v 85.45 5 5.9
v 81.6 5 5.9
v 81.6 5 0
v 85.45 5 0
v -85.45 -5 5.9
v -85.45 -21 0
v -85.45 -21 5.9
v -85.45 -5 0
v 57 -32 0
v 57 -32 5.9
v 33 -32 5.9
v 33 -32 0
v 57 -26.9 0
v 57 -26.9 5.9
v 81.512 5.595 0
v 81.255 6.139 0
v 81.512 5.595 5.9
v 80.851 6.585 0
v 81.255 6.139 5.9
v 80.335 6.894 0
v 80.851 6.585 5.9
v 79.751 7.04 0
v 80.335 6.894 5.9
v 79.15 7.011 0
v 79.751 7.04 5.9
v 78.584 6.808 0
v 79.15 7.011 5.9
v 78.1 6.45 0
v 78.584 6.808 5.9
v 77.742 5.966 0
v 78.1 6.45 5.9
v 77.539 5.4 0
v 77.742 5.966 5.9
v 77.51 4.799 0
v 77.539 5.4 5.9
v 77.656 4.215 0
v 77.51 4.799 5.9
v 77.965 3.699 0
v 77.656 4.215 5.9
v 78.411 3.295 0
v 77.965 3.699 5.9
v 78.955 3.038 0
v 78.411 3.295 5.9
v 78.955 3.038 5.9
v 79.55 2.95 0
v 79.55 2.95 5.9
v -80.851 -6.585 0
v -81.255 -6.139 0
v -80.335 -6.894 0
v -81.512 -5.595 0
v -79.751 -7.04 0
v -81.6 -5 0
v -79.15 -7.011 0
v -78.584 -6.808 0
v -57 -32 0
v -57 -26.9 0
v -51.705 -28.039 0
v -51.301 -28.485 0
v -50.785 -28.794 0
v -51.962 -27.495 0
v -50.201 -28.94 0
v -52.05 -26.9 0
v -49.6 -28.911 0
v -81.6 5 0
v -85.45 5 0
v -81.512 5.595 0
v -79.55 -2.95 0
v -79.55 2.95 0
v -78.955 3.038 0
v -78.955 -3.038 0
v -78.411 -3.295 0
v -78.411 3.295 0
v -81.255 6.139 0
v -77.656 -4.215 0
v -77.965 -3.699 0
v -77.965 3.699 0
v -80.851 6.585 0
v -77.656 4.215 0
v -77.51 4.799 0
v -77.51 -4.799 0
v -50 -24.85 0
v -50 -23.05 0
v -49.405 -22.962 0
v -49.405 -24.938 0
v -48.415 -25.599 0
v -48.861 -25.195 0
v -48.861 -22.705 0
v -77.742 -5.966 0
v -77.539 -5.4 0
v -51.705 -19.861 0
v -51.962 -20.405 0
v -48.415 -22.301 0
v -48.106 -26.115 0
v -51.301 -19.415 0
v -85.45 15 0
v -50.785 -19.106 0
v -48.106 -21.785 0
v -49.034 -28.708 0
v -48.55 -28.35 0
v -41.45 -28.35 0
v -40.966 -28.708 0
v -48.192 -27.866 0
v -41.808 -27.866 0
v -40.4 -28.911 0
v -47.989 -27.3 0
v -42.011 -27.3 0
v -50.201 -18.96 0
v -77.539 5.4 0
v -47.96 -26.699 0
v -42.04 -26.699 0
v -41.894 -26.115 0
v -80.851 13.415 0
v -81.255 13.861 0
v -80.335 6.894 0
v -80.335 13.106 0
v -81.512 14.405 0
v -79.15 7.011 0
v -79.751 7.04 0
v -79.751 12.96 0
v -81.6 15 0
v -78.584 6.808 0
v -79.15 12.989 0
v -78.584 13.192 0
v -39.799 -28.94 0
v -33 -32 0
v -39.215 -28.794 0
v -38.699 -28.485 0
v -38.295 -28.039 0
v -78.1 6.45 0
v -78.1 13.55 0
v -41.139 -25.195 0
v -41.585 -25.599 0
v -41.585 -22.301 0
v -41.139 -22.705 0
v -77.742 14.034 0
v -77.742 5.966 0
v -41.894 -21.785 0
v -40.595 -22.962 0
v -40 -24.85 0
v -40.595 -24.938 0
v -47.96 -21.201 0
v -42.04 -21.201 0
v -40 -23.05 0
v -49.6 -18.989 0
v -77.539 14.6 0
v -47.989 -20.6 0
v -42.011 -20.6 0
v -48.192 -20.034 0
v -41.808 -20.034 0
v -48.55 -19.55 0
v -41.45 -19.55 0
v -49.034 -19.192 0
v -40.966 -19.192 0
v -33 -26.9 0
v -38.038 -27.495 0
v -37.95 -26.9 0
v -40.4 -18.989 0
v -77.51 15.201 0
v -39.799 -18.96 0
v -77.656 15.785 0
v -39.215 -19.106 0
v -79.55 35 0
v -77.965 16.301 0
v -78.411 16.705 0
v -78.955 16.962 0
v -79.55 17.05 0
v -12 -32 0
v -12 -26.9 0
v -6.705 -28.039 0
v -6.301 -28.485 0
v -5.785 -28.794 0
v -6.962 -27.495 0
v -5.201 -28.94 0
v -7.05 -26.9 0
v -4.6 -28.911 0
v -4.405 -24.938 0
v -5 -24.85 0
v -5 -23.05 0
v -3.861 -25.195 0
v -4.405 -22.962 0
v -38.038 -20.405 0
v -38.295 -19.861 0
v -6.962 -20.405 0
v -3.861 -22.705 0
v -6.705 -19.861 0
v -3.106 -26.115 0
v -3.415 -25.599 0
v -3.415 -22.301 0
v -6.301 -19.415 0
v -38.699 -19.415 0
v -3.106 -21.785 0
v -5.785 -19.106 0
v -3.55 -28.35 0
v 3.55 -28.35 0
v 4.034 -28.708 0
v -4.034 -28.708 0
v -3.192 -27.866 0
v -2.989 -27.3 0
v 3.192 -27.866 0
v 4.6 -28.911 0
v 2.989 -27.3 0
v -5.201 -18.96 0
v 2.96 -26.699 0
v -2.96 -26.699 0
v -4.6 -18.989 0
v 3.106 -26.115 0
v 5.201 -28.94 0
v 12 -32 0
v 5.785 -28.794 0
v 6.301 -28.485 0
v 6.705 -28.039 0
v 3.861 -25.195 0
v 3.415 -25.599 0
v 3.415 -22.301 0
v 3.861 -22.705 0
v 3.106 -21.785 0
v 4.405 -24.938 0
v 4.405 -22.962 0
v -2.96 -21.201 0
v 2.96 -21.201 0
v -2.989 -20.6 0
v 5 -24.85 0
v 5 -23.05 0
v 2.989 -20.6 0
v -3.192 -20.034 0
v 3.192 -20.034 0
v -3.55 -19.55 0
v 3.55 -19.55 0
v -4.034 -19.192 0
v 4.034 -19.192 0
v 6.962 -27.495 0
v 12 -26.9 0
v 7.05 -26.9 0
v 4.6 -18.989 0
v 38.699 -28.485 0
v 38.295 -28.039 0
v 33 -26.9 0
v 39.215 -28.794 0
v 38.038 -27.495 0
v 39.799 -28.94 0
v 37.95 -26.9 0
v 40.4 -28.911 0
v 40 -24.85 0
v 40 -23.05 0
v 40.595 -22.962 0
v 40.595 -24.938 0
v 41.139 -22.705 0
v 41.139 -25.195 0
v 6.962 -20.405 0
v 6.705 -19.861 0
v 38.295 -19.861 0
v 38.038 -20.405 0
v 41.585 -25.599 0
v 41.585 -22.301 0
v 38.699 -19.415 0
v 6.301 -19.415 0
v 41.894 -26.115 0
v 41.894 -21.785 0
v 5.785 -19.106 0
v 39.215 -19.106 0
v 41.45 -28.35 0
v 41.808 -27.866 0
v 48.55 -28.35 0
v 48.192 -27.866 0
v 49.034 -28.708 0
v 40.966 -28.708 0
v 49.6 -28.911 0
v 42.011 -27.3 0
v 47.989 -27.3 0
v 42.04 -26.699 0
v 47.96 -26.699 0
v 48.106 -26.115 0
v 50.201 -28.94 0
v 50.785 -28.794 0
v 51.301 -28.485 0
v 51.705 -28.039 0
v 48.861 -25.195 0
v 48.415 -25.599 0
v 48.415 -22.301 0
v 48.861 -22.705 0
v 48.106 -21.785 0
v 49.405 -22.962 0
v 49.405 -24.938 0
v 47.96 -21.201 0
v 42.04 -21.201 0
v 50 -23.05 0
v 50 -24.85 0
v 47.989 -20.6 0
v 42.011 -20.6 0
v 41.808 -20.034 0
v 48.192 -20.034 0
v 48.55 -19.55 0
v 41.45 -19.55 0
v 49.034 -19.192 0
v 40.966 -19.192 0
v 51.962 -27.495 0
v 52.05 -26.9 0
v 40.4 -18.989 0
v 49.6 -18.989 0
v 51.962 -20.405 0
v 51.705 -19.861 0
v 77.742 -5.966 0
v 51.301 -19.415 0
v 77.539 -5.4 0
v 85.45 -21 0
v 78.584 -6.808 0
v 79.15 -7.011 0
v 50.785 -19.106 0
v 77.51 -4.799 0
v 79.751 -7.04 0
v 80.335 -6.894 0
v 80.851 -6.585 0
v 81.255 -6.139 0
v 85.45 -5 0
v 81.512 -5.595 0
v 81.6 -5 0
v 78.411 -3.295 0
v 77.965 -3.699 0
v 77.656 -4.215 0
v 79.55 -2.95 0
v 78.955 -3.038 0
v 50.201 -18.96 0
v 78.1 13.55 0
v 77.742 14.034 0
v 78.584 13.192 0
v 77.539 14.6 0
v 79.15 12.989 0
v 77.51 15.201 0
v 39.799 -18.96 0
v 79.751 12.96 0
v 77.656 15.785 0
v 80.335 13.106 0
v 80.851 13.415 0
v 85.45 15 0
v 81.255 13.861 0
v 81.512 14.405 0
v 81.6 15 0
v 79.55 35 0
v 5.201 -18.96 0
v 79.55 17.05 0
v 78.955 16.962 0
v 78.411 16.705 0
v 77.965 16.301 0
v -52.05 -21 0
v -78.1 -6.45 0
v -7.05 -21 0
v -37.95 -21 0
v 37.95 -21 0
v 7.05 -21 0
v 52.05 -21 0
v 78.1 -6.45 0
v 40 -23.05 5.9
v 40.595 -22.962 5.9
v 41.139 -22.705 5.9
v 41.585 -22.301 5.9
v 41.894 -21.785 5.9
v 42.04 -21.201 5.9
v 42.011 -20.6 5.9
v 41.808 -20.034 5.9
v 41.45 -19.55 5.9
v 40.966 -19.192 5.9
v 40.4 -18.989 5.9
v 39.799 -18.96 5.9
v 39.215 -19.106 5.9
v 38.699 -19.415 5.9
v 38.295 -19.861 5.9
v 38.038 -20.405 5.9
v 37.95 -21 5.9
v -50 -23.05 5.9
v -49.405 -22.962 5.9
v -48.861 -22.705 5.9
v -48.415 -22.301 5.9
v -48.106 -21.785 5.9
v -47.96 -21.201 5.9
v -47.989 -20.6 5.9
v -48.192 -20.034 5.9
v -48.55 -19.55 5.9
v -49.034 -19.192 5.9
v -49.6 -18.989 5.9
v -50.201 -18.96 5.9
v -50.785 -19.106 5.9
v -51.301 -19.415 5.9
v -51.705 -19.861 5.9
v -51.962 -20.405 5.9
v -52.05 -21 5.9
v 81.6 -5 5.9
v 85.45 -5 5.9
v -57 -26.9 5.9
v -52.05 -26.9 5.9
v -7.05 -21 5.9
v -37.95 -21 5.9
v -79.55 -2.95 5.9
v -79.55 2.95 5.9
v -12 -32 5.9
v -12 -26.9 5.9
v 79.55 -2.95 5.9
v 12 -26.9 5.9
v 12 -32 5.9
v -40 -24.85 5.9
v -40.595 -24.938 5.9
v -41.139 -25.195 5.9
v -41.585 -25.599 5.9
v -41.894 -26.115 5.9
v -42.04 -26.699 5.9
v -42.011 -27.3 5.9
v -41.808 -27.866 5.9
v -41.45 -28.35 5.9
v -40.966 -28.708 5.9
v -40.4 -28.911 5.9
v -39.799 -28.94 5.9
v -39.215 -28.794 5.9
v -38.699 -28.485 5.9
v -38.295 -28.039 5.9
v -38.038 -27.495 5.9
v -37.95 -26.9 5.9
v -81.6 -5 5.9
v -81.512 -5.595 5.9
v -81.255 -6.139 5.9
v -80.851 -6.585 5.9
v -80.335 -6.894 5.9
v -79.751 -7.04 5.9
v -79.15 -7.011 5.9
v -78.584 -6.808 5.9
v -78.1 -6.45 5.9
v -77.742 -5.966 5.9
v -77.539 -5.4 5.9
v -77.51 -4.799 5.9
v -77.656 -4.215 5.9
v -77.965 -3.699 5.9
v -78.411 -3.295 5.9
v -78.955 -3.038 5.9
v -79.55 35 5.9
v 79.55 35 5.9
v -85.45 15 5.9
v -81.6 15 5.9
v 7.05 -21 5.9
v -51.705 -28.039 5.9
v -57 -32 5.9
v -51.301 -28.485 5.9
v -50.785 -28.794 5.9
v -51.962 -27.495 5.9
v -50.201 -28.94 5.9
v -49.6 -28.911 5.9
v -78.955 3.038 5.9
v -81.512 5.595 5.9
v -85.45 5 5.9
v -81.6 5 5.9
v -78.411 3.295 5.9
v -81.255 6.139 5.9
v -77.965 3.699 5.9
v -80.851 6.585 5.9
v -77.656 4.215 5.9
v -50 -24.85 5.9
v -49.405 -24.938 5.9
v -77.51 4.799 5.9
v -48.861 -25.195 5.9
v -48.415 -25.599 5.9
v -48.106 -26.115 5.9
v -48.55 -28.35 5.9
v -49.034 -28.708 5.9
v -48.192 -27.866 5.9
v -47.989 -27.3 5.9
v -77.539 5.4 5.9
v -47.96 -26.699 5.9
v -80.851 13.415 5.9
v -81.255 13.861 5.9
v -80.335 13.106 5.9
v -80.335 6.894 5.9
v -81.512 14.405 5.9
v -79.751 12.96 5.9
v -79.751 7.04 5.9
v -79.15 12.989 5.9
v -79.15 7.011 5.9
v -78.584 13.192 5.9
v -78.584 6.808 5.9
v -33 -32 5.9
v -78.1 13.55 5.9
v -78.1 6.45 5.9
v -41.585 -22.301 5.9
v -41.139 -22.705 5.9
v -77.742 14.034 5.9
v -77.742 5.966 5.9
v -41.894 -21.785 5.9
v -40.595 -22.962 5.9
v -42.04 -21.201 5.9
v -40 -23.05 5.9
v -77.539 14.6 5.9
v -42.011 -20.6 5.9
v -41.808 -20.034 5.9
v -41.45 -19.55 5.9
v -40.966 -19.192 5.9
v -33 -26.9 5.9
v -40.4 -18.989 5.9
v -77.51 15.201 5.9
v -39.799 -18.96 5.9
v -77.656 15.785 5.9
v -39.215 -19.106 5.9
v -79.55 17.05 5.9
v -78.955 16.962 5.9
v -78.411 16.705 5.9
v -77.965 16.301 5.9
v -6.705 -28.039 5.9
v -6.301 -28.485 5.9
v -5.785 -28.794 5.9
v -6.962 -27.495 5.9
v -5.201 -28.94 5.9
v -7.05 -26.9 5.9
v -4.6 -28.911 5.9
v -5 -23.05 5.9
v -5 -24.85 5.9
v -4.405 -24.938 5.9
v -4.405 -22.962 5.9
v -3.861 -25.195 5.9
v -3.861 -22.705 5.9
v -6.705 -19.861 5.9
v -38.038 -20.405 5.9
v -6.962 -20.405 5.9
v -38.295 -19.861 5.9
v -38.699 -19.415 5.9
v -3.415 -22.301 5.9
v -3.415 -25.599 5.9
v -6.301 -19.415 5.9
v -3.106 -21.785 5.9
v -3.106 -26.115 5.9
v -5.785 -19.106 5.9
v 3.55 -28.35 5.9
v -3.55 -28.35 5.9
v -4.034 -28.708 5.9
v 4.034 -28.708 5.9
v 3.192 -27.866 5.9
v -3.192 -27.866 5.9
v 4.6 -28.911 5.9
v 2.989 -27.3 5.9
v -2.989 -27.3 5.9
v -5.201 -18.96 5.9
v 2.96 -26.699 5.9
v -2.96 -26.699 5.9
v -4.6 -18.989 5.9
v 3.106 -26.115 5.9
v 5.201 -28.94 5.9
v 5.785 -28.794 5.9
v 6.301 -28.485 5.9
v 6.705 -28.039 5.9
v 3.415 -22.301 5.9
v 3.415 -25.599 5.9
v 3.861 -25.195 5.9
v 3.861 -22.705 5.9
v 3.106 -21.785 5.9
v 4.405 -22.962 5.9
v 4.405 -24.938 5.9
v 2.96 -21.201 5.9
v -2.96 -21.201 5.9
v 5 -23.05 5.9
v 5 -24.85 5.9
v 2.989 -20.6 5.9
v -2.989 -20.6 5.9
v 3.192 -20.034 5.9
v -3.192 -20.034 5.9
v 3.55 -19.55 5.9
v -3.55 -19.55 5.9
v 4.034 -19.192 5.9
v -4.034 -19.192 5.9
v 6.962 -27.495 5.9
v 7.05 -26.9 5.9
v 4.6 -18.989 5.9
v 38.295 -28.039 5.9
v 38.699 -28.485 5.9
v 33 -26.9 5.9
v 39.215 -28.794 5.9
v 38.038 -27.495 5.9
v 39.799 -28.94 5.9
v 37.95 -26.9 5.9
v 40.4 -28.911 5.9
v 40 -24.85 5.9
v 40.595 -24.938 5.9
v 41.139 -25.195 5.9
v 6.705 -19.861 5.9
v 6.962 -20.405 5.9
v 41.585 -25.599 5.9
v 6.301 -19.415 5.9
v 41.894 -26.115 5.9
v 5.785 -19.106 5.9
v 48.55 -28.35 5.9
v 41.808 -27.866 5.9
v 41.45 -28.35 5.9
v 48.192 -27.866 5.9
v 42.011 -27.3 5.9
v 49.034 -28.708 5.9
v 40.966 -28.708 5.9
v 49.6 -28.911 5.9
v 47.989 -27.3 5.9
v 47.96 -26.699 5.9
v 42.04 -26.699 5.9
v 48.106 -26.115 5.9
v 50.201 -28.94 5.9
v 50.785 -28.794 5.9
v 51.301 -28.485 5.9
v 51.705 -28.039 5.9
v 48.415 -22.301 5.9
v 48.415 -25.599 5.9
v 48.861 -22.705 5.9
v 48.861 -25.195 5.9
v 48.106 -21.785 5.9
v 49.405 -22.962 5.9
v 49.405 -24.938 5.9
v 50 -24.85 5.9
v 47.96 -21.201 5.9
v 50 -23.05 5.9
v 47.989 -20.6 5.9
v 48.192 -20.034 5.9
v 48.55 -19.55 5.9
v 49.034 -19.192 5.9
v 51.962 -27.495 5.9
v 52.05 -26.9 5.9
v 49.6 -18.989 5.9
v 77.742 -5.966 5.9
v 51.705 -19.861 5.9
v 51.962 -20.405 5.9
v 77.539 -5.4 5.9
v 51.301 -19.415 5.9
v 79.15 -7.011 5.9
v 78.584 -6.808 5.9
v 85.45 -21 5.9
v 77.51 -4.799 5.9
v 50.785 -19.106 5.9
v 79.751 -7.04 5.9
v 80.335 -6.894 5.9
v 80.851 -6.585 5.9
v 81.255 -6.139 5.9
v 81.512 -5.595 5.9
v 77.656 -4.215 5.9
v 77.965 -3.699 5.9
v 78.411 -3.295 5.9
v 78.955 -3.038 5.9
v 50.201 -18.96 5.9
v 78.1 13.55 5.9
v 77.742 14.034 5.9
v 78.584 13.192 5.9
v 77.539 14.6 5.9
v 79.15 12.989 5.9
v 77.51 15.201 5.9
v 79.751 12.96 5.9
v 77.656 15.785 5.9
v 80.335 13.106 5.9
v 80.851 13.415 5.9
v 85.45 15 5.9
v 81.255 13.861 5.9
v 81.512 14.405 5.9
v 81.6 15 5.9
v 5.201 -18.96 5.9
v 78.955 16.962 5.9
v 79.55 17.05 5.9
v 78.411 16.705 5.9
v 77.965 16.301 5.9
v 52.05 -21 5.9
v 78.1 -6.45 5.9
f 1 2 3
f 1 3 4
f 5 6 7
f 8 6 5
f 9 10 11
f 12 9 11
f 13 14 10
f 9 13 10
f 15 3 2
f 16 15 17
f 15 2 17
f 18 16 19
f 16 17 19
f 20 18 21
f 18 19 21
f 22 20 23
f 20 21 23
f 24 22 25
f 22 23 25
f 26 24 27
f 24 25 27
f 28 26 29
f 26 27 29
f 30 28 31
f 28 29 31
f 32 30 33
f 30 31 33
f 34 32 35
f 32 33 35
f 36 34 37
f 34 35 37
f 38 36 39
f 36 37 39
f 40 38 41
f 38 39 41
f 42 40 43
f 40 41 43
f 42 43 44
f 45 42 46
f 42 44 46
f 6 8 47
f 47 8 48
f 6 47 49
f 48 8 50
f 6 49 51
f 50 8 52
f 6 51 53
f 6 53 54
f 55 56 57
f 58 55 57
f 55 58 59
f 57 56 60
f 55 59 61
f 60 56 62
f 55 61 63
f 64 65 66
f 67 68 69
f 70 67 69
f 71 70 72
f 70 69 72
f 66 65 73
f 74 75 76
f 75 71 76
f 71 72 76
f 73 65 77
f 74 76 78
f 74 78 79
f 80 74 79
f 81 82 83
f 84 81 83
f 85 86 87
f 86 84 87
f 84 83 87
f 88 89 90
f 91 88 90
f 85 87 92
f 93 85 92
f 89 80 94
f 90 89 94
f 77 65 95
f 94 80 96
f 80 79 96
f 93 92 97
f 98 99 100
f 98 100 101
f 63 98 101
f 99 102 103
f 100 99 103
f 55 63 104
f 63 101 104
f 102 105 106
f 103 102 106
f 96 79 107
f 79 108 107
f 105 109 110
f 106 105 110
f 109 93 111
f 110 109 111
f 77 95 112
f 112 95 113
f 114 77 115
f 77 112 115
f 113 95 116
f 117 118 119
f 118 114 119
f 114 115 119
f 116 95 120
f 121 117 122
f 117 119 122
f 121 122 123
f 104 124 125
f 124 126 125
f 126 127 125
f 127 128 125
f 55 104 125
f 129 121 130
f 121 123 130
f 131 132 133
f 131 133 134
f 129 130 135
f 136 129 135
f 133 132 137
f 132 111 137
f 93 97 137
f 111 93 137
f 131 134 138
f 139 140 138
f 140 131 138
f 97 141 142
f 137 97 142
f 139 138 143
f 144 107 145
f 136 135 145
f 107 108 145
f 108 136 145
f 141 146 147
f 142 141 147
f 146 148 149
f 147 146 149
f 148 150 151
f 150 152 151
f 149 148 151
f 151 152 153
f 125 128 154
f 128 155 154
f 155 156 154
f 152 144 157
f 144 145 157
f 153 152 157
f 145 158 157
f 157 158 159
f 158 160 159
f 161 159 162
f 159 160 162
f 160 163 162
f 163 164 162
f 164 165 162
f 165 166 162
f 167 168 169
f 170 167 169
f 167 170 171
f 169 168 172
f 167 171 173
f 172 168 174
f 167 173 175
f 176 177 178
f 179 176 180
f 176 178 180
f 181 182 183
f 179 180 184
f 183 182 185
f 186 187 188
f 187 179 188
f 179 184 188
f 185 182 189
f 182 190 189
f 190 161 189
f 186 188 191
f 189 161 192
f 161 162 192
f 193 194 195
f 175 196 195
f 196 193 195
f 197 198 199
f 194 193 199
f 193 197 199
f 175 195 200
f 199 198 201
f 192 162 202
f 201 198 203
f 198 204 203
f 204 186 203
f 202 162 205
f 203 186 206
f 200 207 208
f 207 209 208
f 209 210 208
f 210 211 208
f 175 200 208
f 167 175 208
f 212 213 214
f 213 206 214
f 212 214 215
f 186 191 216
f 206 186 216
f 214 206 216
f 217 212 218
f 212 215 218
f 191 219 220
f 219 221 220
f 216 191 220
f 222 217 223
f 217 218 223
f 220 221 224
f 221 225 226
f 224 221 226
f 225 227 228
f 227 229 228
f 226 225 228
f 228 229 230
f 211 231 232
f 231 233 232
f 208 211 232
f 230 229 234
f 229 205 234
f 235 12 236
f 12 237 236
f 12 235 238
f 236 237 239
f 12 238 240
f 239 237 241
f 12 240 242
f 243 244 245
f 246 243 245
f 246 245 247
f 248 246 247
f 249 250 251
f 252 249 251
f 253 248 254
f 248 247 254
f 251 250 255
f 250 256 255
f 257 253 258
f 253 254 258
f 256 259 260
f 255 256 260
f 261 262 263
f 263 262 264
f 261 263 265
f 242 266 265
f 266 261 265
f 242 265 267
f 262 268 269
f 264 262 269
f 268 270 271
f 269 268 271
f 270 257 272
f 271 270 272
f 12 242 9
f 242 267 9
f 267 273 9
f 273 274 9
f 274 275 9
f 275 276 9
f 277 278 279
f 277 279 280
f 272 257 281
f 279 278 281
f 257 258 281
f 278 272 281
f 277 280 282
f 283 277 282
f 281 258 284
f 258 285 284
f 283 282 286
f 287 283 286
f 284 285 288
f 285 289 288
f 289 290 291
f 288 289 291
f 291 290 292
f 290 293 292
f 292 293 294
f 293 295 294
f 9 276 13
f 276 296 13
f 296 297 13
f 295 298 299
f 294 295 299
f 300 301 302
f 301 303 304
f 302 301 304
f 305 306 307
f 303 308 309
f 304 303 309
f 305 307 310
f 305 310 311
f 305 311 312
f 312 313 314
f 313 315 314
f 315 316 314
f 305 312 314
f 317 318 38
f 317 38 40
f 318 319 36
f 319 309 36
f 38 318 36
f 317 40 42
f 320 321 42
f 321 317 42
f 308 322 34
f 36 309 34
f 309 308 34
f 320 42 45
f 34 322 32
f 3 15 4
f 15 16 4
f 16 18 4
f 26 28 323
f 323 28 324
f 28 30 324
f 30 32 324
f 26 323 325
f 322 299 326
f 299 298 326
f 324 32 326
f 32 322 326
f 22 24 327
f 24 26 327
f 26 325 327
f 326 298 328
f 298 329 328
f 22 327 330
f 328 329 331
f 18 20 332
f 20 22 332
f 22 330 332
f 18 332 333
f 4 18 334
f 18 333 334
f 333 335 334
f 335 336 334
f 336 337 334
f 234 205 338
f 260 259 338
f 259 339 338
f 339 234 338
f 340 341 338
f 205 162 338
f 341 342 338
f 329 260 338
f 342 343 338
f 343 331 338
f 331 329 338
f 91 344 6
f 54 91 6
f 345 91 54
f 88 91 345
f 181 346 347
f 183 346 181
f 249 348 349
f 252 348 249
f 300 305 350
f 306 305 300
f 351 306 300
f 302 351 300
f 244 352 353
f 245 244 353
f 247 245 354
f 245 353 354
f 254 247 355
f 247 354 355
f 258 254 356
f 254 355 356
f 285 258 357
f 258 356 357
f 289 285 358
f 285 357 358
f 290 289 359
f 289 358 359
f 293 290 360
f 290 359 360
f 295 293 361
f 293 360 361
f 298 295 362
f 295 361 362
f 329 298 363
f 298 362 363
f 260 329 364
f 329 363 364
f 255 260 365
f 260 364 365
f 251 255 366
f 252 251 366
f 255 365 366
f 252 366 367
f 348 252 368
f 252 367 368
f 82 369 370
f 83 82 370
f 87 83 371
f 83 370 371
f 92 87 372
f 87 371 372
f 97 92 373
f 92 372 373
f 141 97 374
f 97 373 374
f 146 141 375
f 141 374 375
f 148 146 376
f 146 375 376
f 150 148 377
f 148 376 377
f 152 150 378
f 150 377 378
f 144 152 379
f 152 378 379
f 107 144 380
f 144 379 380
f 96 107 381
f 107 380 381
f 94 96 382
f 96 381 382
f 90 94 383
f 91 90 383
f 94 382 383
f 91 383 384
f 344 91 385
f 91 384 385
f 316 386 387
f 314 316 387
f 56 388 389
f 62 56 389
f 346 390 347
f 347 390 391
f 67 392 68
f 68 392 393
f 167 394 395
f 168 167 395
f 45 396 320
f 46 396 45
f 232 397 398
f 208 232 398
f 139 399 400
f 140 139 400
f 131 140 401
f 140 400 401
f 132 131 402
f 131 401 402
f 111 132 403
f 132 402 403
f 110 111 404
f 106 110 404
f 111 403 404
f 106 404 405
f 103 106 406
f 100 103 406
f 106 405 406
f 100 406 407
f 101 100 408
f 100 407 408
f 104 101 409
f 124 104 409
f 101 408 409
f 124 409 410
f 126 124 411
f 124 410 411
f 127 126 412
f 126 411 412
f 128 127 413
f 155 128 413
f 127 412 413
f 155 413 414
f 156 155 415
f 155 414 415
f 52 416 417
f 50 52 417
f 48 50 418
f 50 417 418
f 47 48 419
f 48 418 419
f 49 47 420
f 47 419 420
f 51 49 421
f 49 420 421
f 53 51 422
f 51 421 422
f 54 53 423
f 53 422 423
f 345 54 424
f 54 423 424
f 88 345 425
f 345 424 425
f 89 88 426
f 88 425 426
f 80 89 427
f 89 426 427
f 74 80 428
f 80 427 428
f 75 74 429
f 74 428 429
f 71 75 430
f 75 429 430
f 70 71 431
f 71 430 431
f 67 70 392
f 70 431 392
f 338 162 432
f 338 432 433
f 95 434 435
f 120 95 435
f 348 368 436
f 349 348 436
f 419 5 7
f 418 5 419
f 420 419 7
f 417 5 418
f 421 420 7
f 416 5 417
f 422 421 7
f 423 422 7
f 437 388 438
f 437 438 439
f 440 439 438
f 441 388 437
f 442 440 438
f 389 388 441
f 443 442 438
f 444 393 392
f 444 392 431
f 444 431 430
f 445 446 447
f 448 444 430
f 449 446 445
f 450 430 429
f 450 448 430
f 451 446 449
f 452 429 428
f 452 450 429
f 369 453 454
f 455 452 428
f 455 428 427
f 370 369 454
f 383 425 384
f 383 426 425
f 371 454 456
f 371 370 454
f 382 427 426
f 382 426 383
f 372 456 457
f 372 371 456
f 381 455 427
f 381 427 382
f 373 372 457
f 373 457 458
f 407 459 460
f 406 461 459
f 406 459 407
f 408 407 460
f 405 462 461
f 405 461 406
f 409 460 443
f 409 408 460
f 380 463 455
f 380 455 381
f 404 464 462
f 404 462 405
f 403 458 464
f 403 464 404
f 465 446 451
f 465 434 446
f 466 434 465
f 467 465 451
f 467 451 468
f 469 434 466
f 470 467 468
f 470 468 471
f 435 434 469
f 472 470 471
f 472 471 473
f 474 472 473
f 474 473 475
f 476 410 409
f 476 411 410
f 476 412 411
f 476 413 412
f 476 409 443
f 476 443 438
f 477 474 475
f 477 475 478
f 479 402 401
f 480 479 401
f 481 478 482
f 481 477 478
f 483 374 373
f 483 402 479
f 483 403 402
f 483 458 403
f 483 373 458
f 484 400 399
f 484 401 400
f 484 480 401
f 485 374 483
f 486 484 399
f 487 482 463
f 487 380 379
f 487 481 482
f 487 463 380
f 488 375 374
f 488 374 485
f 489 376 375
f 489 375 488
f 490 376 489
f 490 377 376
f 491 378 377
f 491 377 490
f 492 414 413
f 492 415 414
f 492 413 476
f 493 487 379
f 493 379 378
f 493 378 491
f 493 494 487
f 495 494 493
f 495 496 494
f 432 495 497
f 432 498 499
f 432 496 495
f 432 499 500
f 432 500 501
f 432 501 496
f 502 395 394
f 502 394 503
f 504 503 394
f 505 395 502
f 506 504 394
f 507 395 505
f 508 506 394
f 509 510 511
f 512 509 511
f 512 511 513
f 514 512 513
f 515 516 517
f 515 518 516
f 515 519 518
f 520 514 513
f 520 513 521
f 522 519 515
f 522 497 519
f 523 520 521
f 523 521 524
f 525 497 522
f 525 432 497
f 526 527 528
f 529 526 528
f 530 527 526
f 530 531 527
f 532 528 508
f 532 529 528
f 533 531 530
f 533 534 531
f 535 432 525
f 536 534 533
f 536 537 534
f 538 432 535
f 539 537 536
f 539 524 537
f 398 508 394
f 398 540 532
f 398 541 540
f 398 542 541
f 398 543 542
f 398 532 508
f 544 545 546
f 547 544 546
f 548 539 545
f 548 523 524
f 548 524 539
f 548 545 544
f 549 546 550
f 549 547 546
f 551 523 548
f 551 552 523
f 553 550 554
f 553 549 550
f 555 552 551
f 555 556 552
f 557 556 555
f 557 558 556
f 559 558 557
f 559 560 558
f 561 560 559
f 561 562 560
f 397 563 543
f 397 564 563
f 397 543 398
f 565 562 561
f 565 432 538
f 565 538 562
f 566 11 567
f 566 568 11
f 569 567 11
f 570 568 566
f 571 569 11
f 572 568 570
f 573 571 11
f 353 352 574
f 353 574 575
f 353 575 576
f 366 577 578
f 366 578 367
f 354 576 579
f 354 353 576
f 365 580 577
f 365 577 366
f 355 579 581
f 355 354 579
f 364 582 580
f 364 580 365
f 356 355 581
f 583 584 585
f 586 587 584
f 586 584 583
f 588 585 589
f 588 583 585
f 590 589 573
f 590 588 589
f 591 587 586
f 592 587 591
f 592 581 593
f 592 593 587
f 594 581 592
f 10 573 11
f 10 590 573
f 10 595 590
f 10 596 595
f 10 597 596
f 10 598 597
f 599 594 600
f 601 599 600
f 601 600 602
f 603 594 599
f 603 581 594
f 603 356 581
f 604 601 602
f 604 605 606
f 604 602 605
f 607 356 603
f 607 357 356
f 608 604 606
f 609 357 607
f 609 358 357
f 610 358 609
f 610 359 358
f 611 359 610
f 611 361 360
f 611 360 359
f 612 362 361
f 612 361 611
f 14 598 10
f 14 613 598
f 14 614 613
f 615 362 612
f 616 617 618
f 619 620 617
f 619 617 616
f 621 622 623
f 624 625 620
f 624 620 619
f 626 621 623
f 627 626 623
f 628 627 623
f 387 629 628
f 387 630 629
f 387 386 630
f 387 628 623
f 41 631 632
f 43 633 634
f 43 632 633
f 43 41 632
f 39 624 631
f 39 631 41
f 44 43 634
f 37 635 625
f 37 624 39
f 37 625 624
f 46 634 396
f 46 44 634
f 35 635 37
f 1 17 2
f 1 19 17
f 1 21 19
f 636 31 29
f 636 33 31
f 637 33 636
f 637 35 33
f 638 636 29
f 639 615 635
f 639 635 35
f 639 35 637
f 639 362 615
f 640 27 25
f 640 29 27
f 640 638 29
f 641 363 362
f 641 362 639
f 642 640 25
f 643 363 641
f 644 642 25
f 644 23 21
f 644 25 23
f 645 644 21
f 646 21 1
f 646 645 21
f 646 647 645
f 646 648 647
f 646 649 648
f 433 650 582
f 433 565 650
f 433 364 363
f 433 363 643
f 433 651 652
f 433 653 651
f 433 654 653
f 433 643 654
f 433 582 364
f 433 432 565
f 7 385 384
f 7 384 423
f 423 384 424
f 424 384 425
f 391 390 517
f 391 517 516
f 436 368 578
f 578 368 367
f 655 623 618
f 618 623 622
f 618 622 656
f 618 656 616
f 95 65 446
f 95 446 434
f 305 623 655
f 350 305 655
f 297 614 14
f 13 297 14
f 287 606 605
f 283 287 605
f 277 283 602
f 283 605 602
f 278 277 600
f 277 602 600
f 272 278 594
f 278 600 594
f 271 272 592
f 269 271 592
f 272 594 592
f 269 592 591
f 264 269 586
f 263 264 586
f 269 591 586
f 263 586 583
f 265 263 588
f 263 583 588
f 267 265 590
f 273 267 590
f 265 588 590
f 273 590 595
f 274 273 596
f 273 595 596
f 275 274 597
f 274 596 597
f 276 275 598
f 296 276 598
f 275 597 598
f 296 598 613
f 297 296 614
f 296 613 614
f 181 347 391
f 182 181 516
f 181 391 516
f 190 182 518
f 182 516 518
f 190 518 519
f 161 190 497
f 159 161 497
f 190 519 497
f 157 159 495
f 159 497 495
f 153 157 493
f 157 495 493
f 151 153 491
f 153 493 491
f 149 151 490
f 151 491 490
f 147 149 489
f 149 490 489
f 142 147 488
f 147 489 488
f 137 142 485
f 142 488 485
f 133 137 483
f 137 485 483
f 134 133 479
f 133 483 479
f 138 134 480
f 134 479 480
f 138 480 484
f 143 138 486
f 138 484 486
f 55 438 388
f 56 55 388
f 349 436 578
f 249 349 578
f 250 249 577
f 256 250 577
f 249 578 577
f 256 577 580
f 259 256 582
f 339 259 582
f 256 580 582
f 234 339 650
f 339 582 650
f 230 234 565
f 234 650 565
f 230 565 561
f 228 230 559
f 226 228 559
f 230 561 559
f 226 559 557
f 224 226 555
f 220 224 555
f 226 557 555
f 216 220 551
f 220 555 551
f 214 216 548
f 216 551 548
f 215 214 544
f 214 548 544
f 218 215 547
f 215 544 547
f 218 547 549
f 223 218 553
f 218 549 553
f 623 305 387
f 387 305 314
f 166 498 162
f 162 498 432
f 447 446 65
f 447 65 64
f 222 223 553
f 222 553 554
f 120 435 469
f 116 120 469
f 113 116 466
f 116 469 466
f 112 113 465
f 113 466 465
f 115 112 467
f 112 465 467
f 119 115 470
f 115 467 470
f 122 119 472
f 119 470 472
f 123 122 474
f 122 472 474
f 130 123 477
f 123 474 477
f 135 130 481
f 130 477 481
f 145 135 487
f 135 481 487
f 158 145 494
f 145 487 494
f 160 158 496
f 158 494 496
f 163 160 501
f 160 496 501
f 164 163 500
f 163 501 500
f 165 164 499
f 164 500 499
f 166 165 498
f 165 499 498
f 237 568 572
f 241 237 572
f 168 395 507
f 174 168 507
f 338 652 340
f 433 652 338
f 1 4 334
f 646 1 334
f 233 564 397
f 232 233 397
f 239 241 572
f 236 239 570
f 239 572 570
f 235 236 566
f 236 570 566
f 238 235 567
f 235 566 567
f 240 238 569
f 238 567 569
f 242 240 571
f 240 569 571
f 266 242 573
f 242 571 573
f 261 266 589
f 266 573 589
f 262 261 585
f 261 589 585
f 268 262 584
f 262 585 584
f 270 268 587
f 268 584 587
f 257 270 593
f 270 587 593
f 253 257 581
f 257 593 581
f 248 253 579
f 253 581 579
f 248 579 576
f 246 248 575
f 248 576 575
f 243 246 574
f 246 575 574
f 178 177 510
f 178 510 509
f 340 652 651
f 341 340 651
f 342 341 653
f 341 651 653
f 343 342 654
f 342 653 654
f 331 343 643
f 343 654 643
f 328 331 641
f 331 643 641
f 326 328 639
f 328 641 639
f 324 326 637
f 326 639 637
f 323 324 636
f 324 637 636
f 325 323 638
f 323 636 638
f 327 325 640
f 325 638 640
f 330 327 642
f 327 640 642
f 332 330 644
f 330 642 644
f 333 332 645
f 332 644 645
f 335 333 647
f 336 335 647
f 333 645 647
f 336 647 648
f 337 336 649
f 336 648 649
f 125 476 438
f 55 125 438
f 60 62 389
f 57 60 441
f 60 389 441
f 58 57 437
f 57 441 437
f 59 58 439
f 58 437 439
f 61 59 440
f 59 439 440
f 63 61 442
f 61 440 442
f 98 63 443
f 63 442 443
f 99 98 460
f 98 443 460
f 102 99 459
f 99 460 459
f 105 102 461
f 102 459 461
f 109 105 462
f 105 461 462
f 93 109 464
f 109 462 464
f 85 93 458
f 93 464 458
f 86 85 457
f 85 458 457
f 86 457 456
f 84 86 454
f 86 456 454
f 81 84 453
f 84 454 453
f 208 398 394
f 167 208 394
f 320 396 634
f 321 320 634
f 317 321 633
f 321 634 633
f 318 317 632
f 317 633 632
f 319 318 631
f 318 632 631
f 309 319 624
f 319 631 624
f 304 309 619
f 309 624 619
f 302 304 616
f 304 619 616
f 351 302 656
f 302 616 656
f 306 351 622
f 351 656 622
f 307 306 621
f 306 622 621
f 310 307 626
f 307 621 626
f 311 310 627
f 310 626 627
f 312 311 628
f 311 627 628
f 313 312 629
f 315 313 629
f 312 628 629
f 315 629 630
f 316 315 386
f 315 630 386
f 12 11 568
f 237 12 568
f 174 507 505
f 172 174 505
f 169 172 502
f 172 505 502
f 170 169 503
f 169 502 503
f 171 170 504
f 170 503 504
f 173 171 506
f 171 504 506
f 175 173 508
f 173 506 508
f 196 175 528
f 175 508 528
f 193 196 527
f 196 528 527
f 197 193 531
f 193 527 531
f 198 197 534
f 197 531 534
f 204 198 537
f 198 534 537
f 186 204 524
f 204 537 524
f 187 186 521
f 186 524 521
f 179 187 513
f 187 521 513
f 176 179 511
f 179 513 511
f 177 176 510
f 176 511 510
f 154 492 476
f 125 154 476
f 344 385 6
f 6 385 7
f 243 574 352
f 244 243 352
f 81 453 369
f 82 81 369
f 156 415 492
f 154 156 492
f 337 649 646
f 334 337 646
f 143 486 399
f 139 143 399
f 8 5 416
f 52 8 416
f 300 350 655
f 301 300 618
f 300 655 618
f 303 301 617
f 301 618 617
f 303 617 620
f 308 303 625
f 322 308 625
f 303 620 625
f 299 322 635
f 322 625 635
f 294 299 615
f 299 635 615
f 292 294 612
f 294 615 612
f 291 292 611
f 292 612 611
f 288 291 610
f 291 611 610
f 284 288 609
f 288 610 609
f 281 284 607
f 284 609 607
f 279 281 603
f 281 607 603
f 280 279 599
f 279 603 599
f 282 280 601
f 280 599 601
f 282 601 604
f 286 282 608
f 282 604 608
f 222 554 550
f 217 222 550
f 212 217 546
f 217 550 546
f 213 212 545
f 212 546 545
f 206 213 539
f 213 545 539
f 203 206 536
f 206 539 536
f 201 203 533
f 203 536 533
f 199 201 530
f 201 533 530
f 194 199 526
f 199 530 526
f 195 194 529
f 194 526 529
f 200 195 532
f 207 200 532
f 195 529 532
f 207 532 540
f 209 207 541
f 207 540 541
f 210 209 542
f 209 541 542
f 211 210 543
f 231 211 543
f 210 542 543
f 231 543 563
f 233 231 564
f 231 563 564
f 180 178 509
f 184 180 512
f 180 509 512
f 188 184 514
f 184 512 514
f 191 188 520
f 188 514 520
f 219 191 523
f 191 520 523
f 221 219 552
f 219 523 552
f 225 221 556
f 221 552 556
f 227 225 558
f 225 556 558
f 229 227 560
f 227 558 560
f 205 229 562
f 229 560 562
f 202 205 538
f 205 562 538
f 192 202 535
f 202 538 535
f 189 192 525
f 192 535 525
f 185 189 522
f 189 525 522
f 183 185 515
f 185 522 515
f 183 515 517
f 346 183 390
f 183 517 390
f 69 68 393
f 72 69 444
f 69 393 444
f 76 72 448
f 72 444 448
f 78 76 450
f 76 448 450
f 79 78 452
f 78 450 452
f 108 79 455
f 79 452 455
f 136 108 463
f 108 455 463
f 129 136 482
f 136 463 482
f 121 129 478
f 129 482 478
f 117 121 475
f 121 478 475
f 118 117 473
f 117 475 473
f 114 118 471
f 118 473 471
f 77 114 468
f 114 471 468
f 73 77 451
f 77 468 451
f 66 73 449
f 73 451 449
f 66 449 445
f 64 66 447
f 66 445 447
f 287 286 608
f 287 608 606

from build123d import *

# Parameters (mm, degrees)
SKETCH1_W           = 170.9
SKETCH1_H           = 70
BOSS_EXTRUDE1_DEPTH = 5.9
CUT_EXTRUDE1_DEPTH  = 6.9
SKETCH3_W           = 5.9
SKETCH3_H           = 10
CUT_EXTRUDE2_DEPTH  = 6.9
SKETCH4_W           = 5.9
SKETCH4_H           = 10
CUT_EXTRUDE3_DEPTH  = 6.9
CUT_EXTRUDE4_REACH  = 7.9
SKETCH5_R           = 2.05


with BuildPart() as part:
    # Sketch1 → Boss-Extrude1 (new body)
    with BuildSketch(Plane.XY):
        Rectangle(SKETCH1_W, SKETCH1_H)
    extrude(amount=BOSS_EXTRUDE1_DEPTH)

    # Sketch2 → Cut-Extrude1 (cut, through all)
    with BuildSketch(Plane.XY.offset(5.9)):
        Polygon((-50, -21), (-85.45, -21), (-85.45, -35), (85.45, -35), (85.45, -21), (50, -21), (50, -26.9), (57, -26.9), (57, -32), (33, -32), (33, -26.9), (40, -26.9), (40, -21), (5, -21), (5, -26.9), (12, -26.9), (12, -32), (-12, -32), (-12, -26.9), (-5, -26.9), (-5, -21), (-40, -21), (-40, -26.9), (-33, -26.9), (-33, -32), (-57, -32), (-57, -26.9), (-50, -26.9), align=None)
    extrude(amount=-CUT_EXTRUDE1_DEPTH, mode=Mode.SUBTRACT)

    # Sketch3 → Cut-Extrude2 (cut, through all)
    with BuildSketch(Plane.XY.offset(5.9)):
        with Locations((82.5, 20)):
            Rectangle(SKETCH3_W, SKETCH3_H)
        with Locations((82.5, 0)):
            Rectangle(SKETCH3_W, SKETCH3_H)
        with Locations((-82.5, 0)):
            Rectangle(SKETCH3_W, SKETCH3_H)
        with Locations((-82.5, 20)):
            Rectangle(SKETCH3_W, SKETCH3_H)
    extrude(amount=-CUT_EXTRUDE2_DEPTH, mode=Mode.SUBTRACT)

    # Sketch4 → Cut-Extrude3 (cut, through all)
    with BuildSketch(Plane.XY.offset(5.9)):
        with Locations((82.5, 30)):
            Rectangle(SKETCH4_W, SKETCH4_H)
        with Locations((-82.5, 30)):
            Rectangle(SKETCH4_W, SKETCH4_H)
    extrude(amount=-CUT_EXTRUDE3_DEPTH, mode=Mode.SUBTRACT)

    # Sketch5 → Cut-Extrude4 (cut, up to next)
    with BuildSketch(Plane.XY.offset(5.9), mode=Mode.PRIVATE) as cut_extrude4_sk1:
        with Locations((-50, -26.9)):
            Circle(SKETCH5_R)
    cut_extrude4_tool1 = extrude(cut_extrude4_sk1.sketch, amount=-CUT_EXTRUDE4_REACH, mode=Mode.PRIVATE) & part.part
    add(cut_extrude4_tool1.solids().sort_by_distance((-50, -26.9, 5.9))[0], mode=Mode.SUBTRACT)
    # Sketch5 → Cut-Extrude4 (cut, up to next)
    with BuildSketch(Plane.XY.offset(5.9), mode=Mode.PRIVATE) as cut_extrude4_sk2:
        with Locations((-40, -26.9)):
            Circle(SKETCH5_R)
    cut_extrude4_tool2 = extrude(cut_extrude4_sk2.sketch, amount=-CUT_EXTRUDE4_REACH, mode=Mode.PRIVATE) & part.part
    add(cut_extrude4_tool2.solids().sort_by_distance((-40, -26.9, 5.9))[0], mode=Mode.SUBTRACT)
    # Sketch5 → Cut-Extrude4 (cut, up to next)
    with BuildSketch(Plane.XY.offset(5.9), mode=Mode.PRIVATE) as cut_extrude4_sk3:
        with Locations((-50, -21)):
            Circle(SKETCH5_R)
    cut_extrude4_tool3 = extrude(cut_extrude4_sk3.sketch, amount=-CUT_EXTRUDE4_REACH, mode=Mode.PRIVATE) & part.part
    add(cut_extrude4_tool3.solids().sort_by_distance((-50, -21, 5.9))[0], mode=Mode.SUBTRACT)
    # Sketch5 → Cut-Extrude4 (cut, up to next)
    with BuildSketch(Plane.XY.offset(5.9), mode=Mode.PRIVATE) as cut_extrude4_sk4:
        with Locations((-40, -21)):
            Circle(SKETCH5_R)
    cut_extrude4_tool4 = extrude(cut_extrude4_sk4.sketch, amount=-CUT_EXTRUDE4_REACH, mode=Mode.PRIVATE) & part.part
    add(cut_extrude4_tool4.solids().sort_by_distance((-40, -21, 5.9))[0], mode=Mode.SUBTRACT)
    # Sketch5 → Cut-Extrude4 (cut, up to next)
    with BuildSketch(Plane.XY.offset(5.9), mode=Mode.PRIVATE) as cut_extrude4_sk5:
        with Locations((-5, -21)):
            Circle(SKETCH5_R)
    cut_extrude4_tool5 = extrude(cut_extrude4_sk5.sketch, amount=-CUT_EXTRUDE4_REACH, mode=Mode.PRIVATE) & part.part
    add(cut_extrude4_tool5.solids().sort_by_distance((-5, -21, 5.9))[0], mode=Mode.SUBTRACT)
    # Sketch5 → Cut-Extrude4 (cut, up to next)
    with BuildSketch(Plane.XY.offset(5.9), mode=Mode.PRIVATE) as cut_extrude4_sk6:
        with Locations((5, -21)):
            Circle(SKETCH5_R)
    cut_extrude4_tool6 = extrude(cut_extrude4_sk6.sketch, amount=-CUT_EXTRUDE4_REACH, mode=Mode.PRIVATE) & part.part
    add(cut_extrude4_tool6.solids().sort_by_distance((5, -21, 5.9))[0], mode=Mode.SUBTRACT)
    # Sketch5 → Cut-Extrude4 (cut, up to next)
    with BuildSketch(Plane.XY.offset(5.9), mode=Mode.PRIVATE) as cut_extrude4_sk7:
        with Locations((-5, -26.9)):
            Circle(SKETCH5_R)
    cut_extrude4_tool7 = extrude(cut_extrude4_sk7.sketch, amount=-CUT_EXTRUDE4_REACH, mode=Mode.PRIVATE) & part.part
    add(cut_extrude4_tool7.solids().sort_by_distance((-5, -26.9, 5.9))[0], mode=Mode.SUBTRACT)
    # Sketch5 → Cut-Extrude4 (cut, up to next)
    with BuildSketch(Plane.XY.offset(5.9), mode=Mode.PRIVATE) as cut_extrude4_sk8:
        with Locations((5, -26.9)):
            Circle(SKETCH5_R)
    cut_extrude4_tool8 = extrude(cut_extrude4_sk8.sketch, amount=-CUT_EXTRUDE4_REACH, mode=Mode.PRIVATE) & part.part
    add(cut_extrude4_tool8.solids().sort_by_distance((5, -26.9, 5.9))[0], mode=Mode.SUBTRACT)
    # Sketch5 → Cut-Extrude4 (cut, up to next)
    with BuildSketch(Plane.XY.offset(5.9), mode=Mode.PRIVATE) as cut_extrude4_sk9:
        with Locations((40, -26.9)):
            Circle(SKETCH5_R)
    cut_extrude4_tool9 = extrude(cut_extrude4_sk9.sketch, amount=-CUT_EXTRUDE4_REACH, mode=Mode.PRIVATE) & part.part
    add(cut_extrude4_tool9.solids().sort_by_distance((40, -26.9, 5.9))[0], mode=Mode.SUBTRACT)
    # Sketch5 → Cut-Extrude4 (cut, up to next)
    with BuildSketch(Plane.XY.offset(5.9), mode=Mode.PRIVATE) as cut_extrude4_sk10:
        with Locations((50, -26.9)):
            Circle(SKETCH5_R)
    cut_extrude4_tool10 = extrude(cut_extrude4_sk10.sketch, amount=-CUT_EXTRUDE4_REACH, mode=Mode.PRIVATE) & part.part
    add(cut_extrude4_tool10.solids().sort_by_distance((50, -26.9, 5.9))[0], mode=Mode.SUBTRACT)
    # Sketch5 → Cut-Extrude4 (cut, up to next)
    with BuildSketch(Plane.XY.offset(5.9), mode=Mode.PRIVATE) as cut_extrude4_sk11:
        with Locations((50, -21)):
            Circle(SKETCH5_R)
    cut_extrude4_tool11 = extrude(cut_extrude4_sk11.sketch, amount=-CUT_EXTRUDE4_REACH, mode=Mode.PRIVATE) & part.part
    add(cut_extrude4_tool11.solids().sort_by_distance((50, -21, 5.9))[0], mode=Mode.SUBTRACT)
    # Sketch5 → Cut-Extrude4 (cut, up to next)
    with BuildSketch(Plane.XY.offset(5.9), mode=Mode.PRIVATE) as cut_extrude4_sk12:
        with Locations((40, -21)):
            Circle(SKETCH5_R)
    cut_extrude4_tool12 = extrude(cut_extrude4_sk12.sketch, amount=-CUT_EXTRUDE4_REACH, mode=Mode.PRIVATE) & part.part
    add(cut_extrude4_tool12.solids().sort_by_distance((40, -21, 5.9))[0], mode=Mode.SUBTRACT)
    # Sketch5 → Cut-Extrude4 (cut, up to next)
    with BuildSketch(Plane.XY.offset(5.9), mode=Mode.PRIVATE) as cut_extrude4_sk13:
        with Locations((79.55, -5)):
            Circle(SKETCH5_R)
    cut_extrude4_tool13 = extrude(cut_extrude4_sk13.sketch, amount=-CUT_EXTRUDE4_REACH, mode=Mode.PRIVATE) & part.part
    add(cut_extrude4_tool13.solids().sort_by_distance((79.55, -5, 5.9))[0], mode=Mode.SUBTRACT)
    # Sketch5 → Cut-Extrude4 (cut, up to next)
    with BuildSketch(Plane.XY.offset(5.9), mode=Mode.PRIVATE) as cut_extrude4_sk14:
        with Locations((79.55, 5)):
            Circle(SKETCH5_R)
    cut_extrude4_tool14 = extrude(cut_extrude4_sk14.sketch, amount=-CUT_EXTRUDE4_REACH, mode=Mode.PRIVATE) & part.part
    add(cut_extrude4_tool14.solids().sort_by_distance((79.55, 5, 5.9))[0], mode=Mode.SUBTRACT)
    # Sketch5 → Cut-Extrude4 (cut, up to next)
    with BuildSketch(Plane.XY.offset(5.9), mode=Mode.PRIVATE) as cut_extrude4_sk15:
        with Locations((79.55, 15)):
            Circle(SKETCH5_R)
    cut_extrude4_tool15 = extrude(cut_extrude4_sk15.sketch, amount=-CUT_EXTRUDE4_REACH, mode=Mode.PRIVATE) & part.part
    add(cut_extrude4_tool15.solids().sort_by_distance((79.55, 15, 5.9))[0], mode=Mode.SUBTRACT)
    # Sketch5 → Cut-Extrude4 (cut, up to next)
    with BuildSketch(Plane.XY.offset(5.9), mode=Mode.PRIVATE) as cut_extrude4_sk16:
        with Locations((-79.55, 15)):
            Circle(SKETCH5_R)
    cut_extrude4_tool16 = extrude(cut_extrude4_sk16.sketch, amount=-CUT_EXTRUDE4_REACH, mode=Mode.PRIVATE) & part.part
    add(cut_extrude4_tool16.solids().sort_by_distance((-79.55, 15, 5.9))[0], mode=Mode.SUBTRACT)
    # Sketch5 → Cut-Extrude4 (cut, up to next)
    with BuildSketch(Plane.XY.offset(5.9), mode=Mode.PRIVATE) as cut_extrude4_sk17:
        with Locations((-79.55, 5)):
            Circle(SKETCH5_R)
    cut_extrude4_tool17 = extrude(cut_extrude4_sk17.sketch, amount=-CUT_EXTRUDE4_REACH, mode=Mode.PRIVATE) & part.part
    add(cut_extrude4_tool17.solids().sort_by_distance((-79.55, 5, 5.9))[0], mode=Mode.SUBTRACT)
    # Sketch5 → Cut-Extrude4 (cut, up to next)
    with BuildSketch(Plane.XY.offset(5.9), mode=Mode.PRIVATE) as cut_extrude4_sk18:
        with Locations((-79.55, -5)):
            Circle(SKETCH5_R)
    cut_extrude4_tool18 = extrude(cut_extrude4_sk18.sketch, amount=-CUT_EXTRUDE4_REACH, mode=Mode.PRIVATE) & part.part
    add(cut_extrude4_tool18.solids().sort_by_distance((-79.55, -5, 5.9))[0], mode=Mode.SUBTRACT)


solid = part.part
